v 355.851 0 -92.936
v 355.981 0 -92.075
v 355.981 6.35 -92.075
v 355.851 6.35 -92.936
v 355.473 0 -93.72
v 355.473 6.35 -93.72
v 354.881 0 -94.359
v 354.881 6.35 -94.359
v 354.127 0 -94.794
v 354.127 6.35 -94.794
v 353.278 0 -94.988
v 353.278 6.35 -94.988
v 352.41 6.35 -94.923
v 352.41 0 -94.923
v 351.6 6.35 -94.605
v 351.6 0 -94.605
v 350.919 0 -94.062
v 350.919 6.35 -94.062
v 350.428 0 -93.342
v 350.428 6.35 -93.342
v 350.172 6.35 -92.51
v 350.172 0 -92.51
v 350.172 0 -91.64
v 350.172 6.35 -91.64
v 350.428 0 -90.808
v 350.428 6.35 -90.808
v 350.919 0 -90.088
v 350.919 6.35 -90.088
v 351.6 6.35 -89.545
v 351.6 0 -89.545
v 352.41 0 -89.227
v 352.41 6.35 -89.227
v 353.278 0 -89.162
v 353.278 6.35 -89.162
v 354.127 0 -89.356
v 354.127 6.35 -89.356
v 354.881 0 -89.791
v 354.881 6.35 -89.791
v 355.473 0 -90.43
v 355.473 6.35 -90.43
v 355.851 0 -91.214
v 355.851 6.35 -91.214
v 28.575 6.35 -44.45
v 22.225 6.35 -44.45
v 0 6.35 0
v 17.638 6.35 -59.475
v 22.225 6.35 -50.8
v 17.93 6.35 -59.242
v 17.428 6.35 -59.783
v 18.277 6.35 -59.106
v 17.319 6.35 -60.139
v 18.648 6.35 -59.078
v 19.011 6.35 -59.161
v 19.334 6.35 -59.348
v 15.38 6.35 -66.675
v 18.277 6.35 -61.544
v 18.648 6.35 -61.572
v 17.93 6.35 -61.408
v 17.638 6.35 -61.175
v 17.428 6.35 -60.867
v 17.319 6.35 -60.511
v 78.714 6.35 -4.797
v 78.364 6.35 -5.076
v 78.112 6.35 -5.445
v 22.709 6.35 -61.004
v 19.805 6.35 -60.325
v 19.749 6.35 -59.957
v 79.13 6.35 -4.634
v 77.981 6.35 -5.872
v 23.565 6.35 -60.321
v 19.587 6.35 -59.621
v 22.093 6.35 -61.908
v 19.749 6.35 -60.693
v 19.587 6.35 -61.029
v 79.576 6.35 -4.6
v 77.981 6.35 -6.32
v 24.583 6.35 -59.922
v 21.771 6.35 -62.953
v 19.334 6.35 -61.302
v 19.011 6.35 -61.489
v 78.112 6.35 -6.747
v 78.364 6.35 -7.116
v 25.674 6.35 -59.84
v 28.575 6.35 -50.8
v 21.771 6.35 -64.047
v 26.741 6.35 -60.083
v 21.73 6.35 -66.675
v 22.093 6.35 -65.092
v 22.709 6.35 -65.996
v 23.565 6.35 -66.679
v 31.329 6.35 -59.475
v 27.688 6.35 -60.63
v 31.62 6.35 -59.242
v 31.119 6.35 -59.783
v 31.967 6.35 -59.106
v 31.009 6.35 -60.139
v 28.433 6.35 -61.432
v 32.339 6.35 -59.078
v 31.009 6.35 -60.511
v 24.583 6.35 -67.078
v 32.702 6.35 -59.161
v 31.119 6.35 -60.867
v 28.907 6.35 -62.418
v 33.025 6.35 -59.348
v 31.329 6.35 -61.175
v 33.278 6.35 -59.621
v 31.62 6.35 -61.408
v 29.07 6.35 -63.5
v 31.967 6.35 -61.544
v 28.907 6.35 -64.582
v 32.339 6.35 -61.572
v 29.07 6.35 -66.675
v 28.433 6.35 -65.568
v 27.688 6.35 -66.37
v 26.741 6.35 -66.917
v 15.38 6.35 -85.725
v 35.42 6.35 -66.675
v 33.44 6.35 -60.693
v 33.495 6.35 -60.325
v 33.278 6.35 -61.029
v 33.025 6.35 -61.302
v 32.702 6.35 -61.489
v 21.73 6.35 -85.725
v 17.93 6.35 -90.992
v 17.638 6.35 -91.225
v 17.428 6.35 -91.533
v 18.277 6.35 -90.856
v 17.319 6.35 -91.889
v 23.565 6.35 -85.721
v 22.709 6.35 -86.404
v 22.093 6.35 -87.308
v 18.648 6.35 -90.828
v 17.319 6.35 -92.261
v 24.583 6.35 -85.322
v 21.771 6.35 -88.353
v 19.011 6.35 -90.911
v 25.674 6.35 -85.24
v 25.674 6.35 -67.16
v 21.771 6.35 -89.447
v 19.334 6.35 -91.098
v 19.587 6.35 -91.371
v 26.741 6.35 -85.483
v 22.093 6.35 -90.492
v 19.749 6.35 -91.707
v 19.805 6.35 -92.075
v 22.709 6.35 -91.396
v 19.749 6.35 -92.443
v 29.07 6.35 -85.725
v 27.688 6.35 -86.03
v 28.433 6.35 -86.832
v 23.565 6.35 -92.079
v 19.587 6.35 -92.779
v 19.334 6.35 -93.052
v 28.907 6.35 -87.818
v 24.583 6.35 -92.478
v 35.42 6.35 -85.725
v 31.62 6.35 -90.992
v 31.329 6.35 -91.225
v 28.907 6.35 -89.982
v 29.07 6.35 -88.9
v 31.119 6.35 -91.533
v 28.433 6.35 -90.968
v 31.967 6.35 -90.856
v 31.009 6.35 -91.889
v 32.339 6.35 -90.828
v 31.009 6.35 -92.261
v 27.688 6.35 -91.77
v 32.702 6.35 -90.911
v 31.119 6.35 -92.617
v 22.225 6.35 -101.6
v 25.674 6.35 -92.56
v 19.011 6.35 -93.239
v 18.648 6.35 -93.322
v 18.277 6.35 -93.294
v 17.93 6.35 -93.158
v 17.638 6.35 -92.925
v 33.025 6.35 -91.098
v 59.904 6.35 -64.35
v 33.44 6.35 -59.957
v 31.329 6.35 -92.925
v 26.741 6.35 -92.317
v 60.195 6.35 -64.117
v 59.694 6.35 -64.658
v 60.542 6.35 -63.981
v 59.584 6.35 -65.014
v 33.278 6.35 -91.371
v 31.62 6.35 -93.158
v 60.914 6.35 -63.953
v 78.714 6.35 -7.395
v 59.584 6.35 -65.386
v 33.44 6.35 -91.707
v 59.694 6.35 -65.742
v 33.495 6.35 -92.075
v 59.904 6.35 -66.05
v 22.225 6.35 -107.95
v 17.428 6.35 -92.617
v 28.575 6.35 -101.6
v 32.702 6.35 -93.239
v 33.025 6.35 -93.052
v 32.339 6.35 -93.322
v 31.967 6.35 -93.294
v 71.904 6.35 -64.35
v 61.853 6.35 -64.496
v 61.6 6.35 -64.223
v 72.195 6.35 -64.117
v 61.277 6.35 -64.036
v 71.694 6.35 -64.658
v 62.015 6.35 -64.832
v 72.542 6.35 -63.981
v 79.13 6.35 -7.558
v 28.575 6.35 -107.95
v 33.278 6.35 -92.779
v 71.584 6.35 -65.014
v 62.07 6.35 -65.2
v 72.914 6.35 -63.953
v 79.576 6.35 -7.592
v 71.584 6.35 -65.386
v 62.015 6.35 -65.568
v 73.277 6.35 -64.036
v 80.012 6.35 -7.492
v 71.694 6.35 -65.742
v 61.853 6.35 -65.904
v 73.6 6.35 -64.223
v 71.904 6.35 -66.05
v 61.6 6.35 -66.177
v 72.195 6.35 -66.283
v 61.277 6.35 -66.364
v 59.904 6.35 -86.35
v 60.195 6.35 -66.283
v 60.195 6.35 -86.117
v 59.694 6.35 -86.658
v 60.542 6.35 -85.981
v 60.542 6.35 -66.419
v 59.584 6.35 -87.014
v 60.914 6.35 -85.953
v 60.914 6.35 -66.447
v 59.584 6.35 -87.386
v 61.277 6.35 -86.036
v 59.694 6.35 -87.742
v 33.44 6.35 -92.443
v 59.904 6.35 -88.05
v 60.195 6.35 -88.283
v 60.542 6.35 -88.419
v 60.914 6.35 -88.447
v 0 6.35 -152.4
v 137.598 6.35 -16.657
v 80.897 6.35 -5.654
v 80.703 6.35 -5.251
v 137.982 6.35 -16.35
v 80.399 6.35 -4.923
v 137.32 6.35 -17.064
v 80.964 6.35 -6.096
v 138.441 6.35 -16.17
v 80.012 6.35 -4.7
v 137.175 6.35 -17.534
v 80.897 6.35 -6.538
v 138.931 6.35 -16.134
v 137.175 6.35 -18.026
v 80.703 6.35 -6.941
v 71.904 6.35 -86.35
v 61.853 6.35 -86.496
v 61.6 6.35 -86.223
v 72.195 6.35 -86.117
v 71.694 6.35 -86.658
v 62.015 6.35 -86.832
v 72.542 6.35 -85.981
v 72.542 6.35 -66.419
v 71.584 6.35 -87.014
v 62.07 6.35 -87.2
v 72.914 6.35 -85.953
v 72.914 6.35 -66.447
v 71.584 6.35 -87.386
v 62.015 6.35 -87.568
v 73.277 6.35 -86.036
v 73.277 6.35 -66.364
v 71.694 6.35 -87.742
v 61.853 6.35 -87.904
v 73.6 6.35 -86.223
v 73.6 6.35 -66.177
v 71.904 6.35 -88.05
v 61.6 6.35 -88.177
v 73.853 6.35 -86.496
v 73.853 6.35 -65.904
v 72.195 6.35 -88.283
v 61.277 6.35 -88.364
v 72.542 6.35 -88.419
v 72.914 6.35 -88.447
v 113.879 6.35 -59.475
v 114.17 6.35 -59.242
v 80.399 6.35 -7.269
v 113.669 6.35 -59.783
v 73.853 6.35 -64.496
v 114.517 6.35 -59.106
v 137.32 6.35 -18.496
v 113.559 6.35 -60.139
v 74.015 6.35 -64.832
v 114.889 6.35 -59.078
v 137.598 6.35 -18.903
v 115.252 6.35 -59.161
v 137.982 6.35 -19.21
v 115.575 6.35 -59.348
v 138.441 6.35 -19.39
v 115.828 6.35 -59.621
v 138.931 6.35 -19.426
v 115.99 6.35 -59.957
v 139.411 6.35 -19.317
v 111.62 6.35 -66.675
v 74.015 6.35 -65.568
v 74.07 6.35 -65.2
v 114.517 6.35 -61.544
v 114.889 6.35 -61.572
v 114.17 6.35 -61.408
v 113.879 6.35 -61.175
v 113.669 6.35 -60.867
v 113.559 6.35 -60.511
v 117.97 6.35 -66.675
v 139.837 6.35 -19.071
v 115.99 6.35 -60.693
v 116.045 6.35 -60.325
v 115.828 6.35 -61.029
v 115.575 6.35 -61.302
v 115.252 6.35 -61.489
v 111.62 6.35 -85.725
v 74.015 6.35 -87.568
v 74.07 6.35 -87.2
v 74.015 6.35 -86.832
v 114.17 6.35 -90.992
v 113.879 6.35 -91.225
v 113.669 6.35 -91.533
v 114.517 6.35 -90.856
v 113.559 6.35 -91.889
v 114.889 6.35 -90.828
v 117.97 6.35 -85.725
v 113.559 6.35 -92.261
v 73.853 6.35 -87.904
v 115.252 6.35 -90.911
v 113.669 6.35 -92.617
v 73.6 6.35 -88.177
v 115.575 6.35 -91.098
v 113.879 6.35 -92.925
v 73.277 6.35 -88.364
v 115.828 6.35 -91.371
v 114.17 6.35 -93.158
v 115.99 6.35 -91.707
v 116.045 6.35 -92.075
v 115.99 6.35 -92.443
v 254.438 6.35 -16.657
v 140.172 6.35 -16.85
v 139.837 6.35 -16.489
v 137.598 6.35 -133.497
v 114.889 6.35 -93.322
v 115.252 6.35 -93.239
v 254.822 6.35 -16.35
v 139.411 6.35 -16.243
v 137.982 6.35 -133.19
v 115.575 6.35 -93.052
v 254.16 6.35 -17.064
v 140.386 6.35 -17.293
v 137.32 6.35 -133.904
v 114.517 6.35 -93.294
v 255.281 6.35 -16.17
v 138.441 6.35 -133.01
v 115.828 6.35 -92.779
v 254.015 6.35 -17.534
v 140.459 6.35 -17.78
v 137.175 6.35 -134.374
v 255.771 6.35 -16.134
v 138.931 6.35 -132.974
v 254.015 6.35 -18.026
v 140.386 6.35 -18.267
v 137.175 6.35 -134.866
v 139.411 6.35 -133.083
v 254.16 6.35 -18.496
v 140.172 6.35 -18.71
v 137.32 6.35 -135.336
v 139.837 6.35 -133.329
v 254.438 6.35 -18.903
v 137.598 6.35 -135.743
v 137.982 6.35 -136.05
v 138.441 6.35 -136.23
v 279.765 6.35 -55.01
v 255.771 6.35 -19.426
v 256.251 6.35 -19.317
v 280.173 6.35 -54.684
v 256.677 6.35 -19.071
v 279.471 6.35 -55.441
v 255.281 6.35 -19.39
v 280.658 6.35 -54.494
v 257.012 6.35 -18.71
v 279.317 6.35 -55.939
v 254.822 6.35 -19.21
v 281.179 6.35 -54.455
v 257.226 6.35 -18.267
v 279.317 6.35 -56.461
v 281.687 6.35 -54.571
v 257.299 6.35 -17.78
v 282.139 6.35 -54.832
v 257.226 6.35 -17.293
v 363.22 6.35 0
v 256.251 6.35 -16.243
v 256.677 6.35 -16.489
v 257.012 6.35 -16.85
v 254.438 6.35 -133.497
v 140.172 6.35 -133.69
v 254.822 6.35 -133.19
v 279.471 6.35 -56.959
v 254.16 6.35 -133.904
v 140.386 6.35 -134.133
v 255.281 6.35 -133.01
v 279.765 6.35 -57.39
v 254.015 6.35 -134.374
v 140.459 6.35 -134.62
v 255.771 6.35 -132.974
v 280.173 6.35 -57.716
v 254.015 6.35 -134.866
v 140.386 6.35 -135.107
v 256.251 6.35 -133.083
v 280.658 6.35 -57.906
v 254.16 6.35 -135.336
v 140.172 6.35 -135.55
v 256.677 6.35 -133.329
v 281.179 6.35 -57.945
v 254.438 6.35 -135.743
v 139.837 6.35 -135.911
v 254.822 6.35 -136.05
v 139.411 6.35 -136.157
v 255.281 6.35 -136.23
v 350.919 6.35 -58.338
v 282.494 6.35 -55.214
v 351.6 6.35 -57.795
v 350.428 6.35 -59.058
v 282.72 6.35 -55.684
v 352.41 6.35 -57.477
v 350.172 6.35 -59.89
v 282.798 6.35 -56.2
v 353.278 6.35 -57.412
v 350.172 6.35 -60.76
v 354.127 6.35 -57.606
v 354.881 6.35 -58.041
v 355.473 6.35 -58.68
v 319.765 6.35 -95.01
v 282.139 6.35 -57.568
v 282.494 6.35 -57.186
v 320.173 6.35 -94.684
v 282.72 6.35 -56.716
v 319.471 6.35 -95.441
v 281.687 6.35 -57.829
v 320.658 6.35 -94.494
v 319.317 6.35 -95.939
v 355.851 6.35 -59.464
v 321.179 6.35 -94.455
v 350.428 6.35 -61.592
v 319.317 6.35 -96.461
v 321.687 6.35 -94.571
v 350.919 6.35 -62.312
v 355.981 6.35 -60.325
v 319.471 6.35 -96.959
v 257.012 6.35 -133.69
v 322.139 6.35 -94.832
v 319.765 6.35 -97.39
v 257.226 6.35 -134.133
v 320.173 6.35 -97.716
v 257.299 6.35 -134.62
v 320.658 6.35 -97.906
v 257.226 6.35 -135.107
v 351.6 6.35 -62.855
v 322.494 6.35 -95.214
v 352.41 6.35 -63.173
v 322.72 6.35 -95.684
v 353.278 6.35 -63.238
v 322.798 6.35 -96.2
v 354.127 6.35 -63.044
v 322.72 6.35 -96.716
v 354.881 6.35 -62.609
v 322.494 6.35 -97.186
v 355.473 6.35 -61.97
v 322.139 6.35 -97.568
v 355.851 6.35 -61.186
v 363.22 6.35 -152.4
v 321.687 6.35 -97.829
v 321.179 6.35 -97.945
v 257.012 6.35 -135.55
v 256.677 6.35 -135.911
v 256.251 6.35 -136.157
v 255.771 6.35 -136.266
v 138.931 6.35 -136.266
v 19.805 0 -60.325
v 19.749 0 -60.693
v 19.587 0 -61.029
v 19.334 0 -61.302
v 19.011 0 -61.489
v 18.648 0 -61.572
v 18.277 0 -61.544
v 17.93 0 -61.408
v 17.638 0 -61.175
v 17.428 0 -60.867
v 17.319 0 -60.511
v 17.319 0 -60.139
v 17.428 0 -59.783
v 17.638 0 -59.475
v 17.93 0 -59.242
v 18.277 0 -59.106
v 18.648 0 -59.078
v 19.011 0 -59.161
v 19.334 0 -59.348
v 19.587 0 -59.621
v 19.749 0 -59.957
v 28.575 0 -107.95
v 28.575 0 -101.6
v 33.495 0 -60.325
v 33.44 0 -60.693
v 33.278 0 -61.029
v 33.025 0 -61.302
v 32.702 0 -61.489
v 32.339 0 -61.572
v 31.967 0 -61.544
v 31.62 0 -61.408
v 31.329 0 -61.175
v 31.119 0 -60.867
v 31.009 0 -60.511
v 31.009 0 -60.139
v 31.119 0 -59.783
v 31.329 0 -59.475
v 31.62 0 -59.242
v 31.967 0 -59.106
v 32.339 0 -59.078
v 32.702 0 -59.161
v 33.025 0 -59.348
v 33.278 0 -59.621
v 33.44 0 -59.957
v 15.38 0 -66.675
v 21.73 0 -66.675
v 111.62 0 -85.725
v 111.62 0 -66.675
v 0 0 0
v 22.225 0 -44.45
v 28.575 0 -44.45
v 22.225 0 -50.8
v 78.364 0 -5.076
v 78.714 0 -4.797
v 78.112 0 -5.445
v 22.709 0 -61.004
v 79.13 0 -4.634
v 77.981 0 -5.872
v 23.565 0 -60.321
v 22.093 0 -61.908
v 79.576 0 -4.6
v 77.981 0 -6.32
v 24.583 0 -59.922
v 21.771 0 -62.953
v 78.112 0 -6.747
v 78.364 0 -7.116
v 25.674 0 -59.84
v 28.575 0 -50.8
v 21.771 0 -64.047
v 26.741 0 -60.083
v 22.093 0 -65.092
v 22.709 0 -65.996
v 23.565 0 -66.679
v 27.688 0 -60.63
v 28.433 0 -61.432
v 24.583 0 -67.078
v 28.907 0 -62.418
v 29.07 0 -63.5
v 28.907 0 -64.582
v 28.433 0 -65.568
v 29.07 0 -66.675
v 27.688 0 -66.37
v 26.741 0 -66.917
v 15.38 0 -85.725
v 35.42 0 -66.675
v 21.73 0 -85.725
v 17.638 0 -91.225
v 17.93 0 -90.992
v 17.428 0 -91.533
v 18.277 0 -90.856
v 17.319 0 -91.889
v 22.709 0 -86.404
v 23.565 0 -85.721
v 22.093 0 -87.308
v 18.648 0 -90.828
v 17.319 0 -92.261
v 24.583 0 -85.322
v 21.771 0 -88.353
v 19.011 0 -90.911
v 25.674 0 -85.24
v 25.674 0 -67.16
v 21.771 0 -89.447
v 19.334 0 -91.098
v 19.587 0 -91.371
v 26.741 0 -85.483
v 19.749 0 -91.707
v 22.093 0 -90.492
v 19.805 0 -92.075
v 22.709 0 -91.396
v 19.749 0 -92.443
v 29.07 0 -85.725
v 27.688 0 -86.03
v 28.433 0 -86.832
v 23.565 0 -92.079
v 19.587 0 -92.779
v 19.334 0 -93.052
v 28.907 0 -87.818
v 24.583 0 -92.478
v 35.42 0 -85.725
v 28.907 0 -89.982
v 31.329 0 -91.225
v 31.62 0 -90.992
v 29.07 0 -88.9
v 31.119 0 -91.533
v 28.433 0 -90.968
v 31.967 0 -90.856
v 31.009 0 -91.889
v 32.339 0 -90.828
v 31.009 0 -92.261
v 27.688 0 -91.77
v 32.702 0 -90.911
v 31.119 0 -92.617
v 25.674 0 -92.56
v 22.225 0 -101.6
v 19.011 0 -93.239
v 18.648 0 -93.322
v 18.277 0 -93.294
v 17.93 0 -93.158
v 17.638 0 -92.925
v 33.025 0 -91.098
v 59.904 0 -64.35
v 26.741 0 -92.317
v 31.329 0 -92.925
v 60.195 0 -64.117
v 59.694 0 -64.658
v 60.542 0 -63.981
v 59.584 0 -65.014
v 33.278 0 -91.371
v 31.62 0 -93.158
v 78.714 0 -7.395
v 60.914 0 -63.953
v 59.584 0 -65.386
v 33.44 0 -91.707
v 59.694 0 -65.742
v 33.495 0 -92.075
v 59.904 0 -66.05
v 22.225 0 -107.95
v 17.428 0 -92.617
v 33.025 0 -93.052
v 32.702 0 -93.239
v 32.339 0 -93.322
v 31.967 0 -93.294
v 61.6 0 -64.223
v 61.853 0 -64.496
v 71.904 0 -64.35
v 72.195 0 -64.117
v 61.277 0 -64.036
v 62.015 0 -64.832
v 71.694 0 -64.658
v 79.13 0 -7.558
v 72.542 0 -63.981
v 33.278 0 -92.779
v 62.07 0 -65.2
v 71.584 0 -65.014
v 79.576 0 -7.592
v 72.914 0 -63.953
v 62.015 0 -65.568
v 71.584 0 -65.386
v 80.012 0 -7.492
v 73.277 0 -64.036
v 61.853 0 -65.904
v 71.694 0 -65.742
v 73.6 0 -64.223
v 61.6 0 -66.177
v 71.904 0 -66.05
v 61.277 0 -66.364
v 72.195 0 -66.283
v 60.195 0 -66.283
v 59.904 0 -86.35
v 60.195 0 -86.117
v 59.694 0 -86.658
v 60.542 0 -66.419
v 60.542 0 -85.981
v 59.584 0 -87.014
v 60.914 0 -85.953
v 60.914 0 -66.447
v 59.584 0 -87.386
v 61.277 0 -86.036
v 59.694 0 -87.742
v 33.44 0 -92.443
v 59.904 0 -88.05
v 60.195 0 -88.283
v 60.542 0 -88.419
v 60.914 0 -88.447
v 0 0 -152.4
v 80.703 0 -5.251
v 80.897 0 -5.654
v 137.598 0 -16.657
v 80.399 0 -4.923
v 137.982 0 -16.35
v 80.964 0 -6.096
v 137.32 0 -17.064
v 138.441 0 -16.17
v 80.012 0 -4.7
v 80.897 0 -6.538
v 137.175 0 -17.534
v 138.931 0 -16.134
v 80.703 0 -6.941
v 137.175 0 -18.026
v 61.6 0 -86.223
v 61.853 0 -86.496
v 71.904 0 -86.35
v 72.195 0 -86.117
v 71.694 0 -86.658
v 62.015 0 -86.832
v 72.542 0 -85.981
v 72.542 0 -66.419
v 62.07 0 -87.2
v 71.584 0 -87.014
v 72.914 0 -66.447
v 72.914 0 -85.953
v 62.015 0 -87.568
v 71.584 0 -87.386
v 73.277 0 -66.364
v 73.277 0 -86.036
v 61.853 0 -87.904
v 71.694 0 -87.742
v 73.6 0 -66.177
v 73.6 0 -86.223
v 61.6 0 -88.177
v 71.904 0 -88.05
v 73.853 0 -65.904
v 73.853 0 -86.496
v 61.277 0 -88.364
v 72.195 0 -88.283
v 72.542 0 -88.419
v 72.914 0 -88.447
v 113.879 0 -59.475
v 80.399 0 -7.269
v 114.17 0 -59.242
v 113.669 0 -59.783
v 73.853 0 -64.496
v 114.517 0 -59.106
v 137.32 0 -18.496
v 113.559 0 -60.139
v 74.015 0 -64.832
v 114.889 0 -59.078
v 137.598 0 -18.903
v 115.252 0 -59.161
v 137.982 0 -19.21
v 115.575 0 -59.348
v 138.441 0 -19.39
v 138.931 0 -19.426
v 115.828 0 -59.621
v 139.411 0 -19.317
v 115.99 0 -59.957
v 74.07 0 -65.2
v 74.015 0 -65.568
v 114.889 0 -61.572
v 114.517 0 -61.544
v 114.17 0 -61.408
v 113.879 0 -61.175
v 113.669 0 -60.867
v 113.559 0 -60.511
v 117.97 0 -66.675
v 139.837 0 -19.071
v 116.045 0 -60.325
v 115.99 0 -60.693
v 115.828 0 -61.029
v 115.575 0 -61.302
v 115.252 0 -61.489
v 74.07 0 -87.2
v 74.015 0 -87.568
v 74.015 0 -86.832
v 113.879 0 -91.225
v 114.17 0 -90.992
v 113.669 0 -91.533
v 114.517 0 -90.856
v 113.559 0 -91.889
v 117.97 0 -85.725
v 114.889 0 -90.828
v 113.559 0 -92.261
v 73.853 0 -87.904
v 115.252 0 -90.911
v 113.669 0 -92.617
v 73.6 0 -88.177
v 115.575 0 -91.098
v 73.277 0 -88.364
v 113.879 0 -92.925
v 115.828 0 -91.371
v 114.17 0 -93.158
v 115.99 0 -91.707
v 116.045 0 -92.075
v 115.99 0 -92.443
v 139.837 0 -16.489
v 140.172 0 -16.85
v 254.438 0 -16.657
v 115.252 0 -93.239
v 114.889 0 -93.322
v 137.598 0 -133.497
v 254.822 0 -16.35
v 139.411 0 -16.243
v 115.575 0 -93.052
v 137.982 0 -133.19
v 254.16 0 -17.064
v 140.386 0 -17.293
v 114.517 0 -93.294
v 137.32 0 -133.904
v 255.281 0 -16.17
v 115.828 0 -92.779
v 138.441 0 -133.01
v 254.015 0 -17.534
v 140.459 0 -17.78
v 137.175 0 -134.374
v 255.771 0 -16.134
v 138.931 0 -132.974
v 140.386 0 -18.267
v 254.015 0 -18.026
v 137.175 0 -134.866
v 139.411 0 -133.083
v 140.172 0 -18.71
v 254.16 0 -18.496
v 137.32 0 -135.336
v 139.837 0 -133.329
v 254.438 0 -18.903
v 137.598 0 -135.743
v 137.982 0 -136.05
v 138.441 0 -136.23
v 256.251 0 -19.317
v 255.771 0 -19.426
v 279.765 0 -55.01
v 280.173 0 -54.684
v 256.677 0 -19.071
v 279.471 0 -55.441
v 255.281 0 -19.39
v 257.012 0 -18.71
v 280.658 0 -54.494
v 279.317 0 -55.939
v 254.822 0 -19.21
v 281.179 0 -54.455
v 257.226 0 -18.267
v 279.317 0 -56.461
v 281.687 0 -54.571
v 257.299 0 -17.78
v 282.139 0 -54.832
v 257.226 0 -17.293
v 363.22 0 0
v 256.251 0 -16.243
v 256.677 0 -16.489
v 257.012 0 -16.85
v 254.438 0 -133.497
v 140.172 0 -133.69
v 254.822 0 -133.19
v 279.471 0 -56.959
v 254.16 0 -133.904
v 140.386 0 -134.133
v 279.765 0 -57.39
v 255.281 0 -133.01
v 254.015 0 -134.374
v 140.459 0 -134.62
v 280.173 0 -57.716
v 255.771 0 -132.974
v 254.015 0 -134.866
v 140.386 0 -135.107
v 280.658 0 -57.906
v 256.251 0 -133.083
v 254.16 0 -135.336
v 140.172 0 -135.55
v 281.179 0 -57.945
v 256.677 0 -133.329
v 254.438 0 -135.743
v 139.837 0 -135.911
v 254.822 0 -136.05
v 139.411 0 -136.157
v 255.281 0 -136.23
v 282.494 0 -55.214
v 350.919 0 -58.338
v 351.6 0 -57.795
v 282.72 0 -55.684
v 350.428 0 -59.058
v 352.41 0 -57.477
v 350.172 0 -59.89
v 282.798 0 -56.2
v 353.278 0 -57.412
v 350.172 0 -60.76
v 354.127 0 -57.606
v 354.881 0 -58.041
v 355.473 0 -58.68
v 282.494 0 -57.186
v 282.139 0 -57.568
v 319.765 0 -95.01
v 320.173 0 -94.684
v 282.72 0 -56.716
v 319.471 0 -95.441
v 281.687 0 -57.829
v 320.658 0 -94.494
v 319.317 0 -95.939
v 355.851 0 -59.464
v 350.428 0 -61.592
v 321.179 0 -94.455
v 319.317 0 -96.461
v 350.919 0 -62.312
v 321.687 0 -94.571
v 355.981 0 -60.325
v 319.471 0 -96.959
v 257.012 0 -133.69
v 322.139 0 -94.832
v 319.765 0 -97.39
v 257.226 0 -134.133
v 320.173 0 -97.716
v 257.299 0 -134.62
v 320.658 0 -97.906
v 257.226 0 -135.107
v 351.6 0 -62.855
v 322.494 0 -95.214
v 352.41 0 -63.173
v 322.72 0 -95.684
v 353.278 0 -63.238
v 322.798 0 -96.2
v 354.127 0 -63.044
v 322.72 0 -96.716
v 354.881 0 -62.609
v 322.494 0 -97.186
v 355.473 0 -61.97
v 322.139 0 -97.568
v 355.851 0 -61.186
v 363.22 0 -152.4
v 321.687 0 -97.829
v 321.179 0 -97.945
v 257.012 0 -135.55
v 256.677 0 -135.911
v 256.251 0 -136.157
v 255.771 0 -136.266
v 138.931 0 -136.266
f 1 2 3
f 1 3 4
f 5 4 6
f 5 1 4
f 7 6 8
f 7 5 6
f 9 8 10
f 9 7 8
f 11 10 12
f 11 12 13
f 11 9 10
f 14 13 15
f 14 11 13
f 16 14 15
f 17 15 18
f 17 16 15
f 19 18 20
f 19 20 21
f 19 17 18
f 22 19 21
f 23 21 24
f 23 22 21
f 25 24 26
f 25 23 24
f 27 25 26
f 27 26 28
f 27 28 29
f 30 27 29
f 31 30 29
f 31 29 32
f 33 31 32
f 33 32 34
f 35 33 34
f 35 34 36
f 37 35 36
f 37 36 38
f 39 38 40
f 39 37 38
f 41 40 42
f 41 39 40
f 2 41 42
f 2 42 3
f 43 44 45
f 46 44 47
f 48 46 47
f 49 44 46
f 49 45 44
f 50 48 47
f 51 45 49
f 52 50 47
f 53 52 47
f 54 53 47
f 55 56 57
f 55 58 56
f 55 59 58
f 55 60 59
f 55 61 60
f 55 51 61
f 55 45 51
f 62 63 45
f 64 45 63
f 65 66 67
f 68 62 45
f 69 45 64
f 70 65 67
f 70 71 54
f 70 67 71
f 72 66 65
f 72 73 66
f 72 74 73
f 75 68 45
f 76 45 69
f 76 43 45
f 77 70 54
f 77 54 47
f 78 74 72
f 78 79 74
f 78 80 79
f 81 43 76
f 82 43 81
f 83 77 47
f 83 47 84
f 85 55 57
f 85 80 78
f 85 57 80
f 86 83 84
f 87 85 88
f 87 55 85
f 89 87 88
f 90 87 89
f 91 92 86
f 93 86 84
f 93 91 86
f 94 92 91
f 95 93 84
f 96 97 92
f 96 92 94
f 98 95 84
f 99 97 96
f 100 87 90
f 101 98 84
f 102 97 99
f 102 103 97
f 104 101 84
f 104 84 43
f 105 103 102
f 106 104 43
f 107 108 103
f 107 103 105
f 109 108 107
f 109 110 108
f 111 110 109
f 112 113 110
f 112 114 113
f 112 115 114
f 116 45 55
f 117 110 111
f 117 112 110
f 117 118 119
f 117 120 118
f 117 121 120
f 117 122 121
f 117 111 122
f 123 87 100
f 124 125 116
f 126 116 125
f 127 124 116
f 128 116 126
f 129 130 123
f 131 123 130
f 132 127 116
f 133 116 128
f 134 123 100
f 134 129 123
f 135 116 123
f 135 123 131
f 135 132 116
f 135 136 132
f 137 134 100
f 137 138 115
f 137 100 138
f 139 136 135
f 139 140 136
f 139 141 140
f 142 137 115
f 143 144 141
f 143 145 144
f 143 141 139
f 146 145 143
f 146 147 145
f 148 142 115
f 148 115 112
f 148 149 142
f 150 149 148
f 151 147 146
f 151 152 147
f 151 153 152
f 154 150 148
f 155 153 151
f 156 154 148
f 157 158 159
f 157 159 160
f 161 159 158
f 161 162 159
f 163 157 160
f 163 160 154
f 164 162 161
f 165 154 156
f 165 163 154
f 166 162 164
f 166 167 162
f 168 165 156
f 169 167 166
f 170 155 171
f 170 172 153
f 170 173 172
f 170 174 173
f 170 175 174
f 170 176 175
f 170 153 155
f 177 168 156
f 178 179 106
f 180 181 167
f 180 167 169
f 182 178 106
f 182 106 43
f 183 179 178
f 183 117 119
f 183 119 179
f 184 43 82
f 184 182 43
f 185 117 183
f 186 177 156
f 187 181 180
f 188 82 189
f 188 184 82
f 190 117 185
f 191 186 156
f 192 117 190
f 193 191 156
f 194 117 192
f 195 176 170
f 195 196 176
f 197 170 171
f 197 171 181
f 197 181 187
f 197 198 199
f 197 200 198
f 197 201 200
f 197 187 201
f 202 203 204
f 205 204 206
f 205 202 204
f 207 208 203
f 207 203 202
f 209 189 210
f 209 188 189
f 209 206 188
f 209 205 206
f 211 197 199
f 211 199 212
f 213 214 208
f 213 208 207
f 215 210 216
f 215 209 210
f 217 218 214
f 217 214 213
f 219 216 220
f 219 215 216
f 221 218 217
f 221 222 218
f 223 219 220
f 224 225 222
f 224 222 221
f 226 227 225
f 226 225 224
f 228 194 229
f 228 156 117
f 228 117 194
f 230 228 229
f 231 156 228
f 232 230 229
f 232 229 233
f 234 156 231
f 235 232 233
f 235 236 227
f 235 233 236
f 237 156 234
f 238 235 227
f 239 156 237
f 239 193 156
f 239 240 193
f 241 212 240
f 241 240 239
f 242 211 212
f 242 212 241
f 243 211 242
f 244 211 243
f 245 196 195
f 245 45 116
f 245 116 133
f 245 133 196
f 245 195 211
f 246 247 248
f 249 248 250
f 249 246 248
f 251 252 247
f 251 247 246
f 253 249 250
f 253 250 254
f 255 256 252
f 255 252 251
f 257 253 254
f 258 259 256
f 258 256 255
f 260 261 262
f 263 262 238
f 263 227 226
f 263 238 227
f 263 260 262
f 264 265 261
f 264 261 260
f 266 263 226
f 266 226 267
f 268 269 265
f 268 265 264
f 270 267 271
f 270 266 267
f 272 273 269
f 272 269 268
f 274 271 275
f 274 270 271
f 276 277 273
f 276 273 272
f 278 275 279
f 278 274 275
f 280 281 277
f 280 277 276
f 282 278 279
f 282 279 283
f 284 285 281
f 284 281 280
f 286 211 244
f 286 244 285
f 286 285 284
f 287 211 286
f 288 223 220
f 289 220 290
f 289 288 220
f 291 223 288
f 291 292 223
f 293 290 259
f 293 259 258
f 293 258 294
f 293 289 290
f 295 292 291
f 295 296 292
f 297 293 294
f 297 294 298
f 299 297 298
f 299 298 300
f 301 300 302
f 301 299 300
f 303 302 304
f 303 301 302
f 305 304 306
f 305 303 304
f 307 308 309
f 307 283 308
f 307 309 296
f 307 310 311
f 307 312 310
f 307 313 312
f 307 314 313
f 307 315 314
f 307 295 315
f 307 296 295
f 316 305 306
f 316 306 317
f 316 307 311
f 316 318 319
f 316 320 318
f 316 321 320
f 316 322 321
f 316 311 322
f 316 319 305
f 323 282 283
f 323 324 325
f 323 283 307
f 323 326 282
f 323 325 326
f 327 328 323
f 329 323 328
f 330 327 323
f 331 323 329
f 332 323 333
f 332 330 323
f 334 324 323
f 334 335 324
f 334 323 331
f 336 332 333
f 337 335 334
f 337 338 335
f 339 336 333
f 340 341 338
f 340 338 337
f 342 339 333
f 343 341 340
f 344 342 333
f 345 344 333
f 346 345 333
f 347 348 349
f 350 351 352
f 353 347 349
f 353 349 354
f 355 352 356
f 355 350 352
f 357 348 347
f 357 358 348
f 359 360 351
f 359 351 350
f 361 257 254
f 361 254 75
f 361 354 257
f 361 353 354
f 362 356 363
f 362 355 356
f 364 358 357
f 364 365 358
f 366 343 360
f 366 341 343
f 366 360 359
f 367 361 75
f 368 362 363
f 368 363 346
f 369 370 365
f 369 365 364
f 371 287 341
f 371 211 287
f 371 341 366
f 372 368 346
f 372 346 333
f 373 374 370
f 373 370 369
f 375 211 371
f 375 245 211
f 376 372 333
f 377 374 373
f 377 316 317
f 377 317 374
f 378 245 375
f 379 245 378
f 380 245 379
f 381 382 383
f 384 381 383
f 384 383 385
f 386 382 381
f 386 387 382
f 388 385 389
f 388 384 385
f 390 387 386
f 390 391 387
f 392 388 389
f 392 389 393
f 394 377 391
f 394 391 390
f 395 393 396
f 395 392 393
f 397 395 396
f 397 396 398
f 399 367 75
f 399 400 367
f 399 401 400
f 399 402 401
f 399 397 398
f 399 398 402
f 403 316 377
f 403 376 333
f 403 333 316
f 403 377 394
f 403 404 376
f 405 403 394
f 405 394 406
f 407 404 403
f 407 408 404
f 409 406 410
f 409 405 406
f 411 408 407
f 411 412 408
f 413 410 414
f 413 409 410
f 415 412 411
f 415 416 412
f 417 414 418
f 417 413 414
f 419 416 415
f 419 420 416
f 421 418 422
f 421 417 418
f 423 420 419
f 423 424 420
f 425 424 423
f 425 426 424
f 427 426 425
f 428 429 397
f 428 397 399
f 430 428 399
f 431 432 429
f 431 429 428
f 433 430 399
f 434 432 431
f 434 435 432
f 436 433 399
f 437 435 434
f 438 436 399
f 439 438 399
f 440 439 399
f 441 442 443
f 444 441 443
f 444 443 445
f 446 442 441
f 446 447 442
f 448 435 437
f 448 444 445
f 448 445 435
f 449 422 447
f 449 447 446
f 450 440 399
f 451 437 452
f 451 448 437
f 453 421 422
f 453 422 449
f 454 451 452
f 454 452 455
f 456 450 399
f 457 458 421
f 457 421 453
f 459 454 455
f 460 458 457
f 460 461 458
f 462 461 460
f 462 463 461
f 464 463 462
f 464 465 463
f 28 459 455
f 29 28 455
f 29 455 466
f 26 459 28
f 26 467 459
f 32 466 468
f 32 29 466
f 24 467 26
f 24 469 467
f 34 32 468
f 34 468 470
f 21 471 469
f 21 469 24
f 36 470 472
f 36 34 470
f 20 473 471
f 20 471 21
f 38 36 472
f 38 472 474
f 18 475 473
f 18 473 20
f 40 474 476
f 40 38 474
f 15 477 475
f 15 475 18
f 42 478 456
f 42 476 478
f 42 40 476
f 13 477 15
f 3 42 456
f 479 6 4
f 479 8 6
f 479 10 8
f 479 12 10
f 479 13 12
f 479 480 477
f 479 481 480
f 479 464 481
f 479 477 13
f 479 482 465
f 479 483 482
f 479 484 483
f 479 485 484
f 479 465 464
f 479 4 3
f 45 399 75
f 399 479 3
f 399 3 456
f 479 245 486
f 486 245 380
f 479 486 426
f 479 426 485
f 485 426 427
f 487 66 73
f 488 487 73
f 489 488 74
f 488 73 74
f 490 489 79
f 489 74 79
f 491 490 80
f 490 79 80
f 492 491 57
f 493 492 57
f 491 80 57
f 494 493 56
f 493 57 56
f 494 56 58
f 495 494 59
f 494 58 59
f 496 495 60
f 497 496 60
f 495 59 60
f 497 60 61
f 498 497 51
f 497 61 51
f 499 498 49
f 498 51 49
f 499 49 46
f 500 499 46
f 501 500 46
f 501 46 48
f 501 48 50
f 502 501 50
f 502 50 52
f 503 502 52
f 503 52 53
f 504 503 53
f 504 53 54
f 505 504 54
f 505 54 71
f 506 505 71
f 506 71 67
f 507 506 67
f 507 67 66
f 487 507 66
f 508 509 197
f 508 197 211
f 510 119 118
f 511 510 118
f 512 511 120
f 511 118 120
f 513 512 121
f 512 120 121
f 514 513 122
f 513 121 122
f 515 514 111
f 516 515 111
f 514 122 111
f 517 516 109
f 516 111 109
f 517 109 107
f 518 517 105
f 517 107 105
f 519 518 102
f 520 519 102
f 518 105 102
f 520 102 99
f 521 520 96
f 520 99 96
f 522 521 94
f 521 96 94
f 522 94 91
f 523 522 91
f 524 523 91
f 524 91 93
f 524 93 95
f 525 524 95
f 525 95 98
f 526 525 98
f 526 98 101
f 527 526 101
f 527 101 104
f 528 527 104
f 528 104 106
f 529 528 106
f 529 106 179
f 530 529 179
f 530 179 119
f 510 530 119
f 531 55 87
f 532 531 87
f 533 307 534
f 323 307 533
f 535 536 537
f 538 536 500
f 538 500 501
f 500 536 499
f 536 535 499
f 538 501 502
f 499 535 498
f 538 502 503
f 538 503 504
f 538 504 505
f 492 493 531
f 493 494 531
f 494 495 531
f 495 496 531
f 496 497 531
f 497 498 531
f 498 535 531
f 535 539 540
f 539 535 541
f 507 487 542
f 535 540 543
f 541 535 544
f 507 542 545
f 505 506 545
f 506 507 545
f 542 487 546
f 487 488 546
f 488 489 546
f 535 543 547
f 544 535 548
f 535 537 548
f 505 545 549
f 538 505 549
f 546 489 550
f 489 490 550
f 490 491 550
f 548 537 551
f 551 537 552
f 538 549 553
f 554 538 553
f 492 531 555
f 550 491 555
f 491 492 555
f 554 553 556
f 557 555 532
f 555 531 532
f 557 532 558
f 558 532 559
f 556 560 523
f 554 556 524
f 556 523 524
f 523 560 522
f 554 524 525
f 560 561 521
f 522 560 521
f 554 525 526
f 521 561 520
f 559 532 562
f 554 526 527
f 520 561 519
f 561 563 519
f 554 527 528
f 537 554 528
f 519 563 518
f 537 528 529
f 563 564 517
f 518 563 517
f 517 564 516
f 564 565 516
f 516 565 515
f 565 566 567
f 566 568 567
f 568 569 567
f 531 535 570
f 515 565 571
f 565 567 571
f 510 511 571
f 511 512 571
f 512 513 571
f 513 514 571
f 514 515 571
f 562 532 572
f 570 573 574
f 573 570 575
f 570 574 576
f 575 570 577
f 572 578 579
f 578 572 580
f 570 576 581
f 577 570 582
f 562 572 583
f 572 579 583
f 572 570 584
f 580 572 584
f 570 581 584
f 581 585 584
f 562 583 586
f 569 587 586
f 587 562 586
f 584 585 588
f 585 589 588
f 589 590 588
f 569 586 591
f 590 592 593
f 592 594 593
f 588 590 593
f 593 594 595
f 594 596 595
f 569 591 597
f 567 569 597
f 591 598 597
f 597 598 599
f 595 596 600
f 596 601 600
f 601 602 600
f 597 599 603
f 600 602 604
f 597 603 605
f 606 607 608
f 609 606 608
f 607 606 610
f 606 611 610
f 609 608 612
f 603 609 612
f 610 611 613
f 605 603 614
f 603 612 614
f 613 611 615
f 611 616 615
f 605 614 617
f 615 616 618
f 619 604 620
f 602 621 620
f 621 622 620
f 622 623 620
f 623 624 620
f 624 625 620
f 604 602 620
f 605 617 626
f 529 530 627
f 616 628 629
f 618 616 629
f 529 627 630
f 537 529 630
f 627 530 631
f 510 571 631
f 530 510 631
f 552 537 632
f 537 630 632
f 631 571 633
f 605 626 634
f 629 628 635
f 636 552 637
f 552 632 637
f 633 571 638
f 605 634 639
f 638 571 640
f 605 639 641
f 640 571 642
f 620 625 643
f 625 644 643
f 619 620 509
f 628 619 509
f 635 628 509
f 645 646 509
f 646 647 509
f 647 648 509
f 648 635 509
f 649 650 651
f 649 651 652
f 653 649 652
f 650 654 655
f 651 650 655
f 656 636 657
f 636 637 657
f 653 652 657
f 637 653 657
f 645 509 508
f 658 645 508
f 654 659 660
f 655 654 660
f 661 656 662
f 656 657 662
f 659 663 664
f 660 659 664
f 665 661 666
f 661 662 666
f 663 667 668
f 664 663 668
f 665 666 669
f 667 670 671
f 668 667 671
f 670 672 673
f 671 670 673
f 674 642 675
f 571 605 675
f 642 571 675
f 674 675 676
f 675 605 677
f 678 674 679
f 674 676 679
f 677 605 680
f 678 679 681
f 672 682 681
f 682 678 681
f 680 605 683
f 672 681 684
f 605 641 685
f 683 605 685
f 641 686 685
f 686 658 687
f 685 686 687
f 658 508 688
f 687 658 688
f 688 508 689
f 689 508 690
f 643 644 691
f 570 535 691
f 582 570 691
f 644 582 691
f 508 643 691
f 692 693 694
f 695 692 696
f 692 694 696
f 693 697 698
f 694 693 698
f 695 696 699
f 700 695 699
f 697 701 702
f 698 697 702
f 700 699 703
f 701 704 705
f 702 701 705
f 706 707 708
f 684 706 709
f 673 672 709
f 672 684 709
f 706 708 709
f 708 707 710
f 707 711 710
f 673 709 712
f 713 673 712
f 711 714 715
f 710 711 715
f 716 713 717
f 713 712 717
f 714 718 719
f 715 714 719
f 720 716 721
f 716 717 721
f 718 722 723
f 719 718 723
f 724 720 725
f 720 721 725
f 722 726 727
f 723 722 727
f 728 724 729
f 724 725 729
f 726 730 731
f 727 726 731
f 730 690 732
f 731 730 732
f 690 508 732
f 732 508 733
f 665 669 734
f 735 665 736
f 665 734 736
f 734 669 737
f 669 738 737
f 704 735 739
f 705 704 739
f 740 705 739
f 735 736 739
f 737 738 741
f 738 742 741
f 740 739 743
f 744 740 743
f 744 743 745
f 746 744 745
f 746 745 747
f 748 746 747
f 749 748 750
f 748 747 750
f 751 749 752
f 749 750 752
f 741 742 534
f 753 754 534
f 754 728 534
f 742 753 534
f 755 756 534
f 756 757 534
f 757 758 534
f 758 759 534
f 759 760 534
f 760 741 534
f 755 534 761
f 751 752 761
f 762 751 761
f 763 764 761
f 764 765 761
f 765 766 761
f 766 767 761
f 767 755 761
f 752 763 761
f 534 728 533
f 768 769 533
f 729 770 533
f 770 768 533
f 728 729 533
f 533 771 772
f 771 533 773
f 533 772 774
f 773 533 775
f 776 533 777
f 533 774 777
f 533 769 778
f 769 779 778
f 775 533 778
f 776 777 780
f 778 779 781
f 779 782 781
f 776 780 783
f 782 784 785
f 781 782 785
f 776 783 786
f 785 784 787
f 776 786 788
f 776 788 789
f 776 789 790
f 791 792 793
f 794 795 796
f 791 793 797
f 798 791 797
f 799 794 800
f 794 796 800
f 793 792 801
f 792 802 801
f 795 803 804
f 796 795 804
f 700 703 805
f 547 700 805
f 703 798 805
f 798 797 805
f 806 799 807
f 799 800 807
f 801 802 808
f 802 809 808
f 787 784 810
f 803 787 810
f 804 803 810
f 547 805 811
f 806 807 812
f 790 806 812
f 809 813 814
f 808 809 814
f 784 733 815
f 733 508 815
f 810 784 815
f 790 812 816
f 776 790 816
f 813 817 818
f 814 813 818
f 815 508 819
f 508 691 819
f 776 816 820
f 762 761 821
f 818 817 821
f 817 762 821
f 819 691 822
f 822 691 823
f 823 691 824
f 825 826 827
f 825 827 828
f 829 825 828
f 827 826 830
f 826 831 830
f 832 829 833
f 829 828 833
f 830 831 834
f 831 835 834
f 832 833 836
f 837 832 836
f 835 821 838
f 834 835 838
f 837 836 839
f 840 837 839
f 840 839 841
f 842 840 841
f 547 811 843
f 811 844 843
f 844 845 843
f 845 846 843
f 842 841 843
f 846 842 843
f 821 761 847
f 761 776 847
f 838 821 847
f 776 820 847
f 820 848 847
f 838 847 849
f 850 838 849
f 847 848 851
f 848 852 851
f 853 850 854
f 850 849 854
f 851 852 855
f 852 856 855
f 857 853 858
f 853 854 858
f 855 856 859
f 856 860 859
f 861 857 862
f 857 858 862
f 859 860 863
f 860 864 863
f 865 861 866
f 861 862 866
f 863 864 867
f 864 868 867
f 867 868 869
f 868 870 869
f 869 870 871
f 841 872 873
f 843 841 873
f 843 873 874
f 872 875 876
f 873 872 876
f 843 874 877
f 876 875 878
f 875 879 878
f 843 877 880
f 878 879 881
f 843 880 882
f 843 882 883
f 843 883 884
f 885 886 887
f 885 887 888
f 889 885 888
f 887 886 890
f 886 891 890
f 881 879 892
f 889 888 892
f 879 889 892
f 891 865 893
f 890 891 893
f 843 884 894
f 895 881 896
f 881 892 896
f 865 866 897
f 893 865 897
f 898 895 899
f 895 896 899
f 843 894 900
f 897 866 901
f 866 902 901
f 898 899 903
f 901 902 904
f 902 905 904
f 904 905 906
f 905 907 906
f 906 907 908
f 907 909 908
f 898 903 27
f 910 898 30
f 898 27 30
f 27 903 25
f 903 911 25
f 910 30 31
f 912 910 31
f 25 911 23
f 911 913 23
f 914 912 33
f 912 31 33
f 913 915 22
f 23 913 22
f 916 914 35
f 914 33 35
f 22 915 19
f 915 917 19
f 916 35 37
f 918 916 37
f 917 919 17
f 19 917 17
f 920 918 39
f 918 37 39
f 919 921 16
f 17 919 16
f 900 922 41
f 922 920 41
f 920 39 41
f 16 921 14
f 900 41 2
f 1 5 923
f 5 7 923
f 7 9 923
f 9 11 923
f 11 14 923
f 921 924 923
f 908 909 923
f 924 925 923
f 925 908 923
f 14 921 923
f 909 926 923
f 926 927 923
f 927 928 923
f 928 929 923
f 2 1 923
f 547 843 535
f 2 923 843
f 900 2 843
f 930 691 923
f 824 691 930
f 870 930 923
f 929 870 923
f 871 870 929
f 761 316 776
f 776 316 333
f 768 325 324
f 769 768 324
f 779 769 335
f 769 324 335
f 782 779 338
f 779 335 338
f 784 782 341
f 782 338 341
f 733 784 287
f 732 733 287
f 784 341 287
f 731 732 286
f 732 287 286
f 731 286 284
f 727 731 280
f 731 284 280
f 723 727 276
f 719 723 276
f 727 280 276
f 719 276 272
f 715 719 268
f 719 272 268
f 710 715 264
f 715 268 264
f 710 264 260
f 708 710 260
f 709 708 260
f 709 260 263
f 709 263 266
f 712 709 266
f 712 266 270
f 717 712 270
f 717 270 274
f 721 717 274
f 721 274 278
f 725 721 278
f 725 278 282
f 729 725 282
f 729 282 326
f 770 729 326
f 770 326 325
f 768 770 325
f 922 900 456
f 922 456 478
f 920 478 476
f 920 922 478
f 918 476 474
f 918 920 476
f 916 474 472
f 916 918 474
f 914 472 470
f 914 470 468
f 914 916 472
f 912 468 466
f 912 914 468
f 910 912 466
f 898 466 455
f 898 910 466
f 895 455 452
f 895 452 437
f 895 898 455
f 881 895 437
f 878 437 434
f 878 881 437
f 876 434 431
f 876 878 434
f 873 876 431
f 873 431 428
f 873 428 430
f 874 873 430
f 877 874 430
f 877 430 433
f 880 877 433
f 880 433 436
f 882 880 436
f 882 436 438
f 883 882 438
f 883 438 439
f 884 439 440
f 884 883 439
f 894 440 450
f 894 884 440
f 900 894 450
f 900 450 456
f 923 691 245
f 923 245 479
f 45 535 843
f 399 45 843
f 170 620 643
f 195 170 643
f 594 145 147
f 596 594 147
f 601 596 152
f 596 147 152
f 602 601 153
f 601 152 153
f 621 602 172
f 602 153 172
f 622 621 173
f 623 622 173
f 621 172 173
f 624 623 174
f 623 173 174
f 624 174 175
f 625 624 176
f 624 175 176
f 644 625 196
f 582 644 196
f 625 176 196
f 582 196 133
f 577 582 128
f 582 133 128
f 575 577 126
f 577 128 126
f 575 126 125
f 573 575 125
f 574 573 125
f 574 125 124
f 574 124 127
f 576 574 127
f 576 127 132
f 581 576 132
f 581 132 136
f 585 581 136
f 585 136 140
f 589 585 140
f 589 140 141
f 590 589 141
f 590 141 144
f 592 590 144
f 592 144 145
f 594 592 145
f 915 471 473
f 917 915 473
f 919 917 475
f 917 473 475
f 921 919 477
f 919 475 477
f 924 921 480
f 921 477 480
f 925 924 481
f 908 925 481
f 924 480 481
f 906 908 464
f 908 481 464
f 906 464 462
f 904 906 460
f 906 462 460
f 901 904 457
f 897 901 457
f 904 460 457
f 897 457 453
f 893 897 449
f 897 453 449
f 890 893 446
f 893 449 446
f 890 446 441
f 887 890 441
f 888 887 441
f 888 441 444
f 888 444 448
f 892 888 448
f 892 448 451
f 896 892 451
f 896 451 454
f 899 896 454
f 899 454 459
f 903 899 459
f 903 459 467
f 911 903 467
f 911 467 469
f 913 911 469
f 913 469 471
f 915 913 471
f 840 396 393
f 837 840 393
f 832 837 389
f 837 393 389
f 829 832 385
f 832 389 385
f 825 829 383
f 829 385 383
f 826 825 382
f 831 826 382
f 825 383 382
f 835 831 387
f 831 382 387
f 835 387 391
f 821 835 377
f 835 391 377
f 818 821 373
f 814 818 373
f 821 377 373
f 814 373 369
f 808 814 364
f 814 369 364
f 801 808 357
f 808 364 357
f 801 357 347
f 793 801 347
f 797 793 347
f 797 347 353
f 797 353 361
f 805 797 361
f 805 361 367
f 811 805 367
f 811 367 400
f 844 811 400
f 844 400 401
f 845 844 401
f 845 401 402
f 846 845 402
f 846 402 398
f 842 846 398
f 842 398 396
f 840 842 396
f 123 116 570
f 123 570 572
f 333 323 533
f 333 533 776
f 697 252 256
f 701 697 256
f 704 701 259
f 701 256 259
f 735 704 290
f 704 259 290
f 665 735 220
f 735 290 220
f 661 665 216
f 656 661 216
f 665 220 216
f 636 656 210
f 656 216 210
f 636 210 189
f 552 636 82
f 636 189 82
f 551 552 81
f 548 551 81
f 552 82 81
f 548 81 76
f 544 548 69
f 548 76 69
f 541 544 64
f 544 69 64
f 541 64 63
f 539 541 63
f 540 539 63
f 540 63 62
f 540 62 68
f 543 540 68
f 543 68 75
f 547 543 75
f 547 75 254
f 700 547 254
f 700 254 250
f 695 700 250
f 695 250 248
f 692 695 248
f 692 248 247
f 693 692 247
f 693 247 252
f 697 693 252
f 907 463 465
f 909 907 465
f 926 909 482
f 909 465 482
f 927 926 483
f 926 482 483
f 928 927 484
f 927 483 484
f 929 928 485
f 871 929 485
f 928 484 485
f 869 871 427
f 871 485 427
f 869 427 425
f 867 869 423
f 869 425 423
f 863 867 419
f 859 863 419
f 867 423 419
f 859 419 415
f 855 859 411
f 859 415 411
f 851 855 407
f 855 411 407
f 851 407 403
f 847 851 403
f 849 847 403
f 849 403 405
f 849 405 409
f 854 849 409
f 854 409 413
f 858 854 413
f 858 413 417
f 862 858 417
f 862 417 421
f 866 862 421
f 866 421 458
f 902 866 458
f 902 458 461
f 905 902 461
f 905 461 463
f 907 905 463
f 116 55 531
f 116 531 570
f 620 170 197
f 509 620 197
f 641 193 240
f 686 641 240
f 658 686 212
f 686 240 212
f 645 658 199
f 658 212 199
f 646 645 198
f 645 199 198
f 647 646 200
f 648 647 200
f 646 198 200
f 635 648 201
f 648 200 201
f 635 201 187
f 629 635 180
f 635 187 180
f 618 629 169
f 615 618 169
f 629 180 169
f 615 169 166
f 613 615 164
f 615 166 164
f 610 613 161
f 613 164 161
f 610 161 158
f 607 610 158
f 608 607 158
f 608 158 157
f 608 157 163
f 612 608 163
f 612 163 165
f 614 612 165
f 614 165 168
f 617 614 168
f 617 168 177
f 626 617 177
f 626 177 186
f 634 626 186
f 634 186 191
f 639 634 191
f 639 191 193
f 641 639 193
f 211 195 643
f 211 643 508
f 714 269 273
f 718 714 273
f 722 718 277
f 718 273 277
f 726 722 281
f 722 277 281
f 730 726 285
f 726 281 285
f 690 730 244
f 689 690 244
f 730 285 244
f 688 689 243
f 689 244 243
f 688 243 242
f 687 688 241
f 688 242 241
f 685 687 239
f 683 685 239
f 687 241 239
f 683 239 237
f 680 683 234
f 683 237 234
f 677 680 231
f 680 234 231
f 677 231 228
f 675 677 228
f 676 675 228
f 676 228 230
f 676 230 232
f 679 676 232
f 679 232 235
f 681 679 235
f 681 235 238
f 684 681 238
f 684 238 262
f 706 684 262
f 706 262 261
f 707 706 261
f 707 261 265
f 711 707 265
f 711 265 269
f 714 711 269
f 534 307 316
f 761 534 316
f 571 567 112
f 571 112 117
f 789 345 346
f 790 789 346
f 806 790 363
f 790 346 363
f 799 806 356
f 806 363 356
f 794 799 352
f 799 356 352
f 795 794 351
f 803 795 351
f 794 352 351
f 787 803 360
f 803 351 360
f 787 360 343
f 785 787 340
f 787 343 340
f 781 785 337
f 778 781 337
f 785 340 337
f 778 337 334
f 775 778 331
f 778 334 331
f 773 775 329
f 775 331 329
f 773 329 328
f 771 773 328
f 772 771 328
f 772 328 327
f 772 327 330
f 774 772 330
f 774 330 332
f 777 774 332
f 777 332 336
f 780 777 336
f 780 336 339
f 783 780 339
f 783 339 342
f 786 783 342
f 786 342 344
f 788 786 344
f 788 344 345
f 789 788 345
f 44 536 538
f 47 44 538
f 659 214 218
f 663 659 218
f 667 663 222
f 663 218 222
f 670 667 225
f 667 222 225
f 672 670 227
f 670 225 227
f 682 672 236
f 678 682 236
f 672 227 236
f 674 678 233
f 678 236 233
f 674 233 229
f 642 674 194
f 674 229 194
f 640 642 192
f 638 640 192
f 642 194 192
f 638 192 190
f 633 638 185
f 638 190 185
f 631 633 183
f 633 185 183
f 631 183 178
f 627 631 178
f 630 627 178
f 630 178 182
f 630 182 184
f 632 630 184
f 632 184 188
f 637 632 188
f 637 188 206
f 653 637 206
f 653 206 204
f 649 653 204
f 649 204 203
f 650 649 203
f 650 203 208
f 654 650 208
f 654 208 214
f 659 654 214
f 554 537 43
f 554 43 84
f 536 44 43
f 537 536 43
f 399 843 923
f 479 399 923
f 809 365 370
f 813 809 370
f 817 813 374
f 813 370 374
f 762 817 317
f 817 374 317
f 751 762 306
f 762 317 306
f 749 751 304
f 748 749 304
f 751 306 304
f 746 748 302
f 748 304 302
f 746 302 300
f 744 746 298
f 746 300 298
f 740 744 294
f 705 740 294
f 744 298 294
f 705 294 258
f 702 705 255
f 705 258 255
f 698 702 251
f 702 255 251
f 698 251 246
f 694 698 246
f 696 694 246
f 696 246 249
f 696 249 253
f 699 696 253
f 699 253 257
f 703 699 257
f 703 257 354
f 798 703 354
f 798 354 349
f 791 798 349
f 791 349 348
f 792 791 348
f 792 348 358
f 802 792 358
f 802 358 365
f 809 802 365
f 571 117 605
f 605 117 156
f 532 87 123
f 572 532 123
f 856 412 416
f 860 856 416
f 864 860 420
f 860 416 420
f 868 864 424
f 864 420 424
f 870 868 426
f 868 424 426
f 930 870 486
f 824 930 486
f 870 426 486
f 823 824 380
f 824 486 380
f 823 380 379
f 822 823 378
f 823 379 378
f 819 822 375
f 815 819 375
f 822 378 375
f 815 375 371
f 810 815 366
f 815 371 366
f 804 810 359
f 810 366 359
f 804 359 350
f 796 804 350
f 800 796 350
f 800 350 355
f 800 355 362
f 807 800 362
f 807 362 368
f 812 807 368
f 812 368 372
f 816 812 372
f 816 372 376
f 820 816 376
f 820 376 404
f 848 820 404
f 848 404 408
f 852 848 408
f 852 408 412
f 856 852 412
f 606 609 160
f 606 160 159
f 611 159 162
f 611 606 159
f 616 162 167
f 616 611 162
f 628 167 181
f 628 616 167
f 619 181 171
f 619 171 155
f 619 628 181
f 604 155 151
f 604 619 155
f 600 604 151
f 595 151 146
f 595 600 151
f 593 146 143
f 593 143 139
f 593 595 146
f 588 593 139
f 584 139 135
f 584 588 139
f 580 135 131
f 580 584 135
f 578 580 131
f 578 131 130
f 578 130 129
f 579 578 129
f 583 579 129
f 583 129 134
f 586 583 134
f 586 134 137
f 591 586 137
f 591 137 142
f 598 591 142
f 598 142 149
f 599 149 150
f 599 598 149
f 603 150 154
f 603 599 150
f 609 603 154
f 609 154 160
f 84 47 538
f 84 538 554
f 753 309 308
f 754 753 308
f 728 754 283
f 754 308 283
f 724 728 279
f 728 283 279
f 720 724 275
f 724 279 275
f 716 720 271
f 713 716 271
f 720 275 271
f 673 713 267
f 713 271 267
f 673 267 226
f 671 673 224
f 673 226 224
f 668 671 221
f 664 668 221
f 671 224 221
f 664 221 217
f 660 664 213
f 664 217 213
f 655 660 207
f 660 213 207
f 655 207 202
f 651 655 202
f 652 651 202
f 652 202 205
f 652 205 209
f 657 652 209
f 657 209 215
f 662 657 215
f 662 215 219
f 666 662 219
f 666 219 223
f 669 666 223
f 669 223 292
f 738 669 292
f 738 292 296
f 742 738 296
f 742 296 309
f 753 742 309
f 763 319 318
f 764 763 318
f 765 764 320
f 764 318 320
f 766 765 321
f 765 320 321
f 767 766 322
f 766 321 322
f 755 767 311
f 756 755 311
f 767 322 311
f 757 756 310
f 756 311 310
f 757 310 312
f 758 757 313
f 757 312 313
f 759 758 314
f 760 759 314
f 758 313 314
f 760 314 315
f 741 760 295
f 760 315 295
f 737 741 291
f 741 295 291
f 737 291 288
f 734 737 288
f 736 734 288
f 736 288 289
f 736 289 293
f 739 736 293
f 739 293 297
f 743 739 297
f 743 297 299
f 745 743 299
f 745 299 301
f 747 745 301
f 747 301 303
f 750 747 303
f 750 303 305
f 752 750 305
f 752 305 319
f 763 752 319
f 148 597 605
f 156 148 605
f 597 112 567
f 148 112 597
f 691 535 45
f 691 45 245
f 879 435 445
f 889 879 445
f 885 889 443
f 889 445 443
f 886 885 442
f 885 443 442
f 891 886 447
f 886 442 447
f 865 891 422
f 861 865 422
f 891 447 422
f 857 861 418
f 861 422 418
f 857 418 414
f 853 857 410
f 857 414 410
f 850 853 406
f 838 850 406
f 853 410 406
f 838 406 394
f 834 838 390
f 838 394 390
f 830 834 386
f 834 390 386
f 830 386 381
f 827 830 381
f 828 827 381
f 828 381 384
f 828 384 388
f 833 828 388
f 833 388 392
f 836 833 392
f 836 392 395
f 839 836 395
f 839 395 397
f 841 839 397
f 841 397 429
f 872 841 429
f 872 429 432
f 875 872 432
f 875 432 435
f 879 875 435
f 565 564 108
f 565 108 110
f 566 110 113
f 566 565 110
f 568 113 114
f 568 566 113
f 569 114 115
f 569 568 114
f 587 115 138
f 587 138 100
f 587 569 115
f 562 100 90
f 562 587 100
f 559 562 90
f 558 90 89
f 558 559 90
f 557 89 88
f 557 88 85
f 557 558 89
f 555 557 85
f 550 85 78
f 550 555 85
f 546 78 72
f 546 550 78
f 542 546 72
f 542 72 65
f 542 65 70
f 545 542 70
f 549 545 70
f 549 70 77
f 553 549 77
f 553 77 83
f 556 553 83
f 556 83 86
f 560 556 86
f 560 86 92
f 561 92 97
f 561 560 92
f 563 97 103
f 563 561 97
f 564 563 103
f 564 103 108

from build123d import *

# Parameters (mm, degrees)
SKETCH1_W           = 363.22
SKETCH1_H           = 152.4
SKETCH1_R           = 3.6703
SKETCH1_R_2         = 2.921
BOSS_EXTRUDE1_DEPTH = 6.35
SKETCH2_W           = 6.35
SKETCH2_H           = 6.35
SKETCH2_H_2         = 19.05000003
SKETCH2_H_3         = 19.05
CUT_EXTRUDE1_DEPTH  = 7.35
SKETCH5_R           = 1.5
CUT_EXTRUDE2_DEPTH  = 7.35
SKETCH7_R           = 1.651
CUT_EXTRUDE3_DEPTH  = 7.35
SKETCH8_R           = 1.75
CUT_EXTRUDE4_DEPTH  = 7.35
SKETCH9_R           = 1.25
CUT_EXTRUDE5_DEPTH  = 7.35
SKETCH10_R          = 1.25
CUT_EXTRUDE6_DEPTH  = 7.35


with BuildPart() as part:
    # Sketch1 → Boss-Extrude1 (new body)
    with BuildSketch(Plane(origin=(0, 0, 0), x_dir=(1, 0, 0), z_dir=(0, 1, 0))):
        with Locations((181.61, 76.2)):
            Rectangle(SKETCH1_W, SKETCH1_H)
        with Locations((25.4, 63.5)):
            Circle(SKETCH1_R, mode=Mode.SUBTRACT)
        with Locations((25.4, 88.9)):
            Circle(SKETCH1_R, mode=Mode.SUBTRACT)
        with Locations((353.06, 60.325)):
            Circle(SKETCH1_R_2, mode=Mode.SUBTRACT)
        with Locations((353.06, 92.075)):
            Circle(SKETCH1_R_2, mode=Mode.SUBTRACT)
    extrude(amount=BOSS_EXTRUDE1_DEPTH)

    # Sketch2 → Cut-Extrude1 (cut, through all)
    with BuildSketch(Plane(origin=(0, 6.35, 0), x_dir=(1, 0, 0), z_dir=(0, 1, 0))):
        with Locations((25.4, 104.775)):
            Rectangle(SKETCH2_W, SKETCH2_H)
        with Locations((25.4, 47.625)):
            Rectangle(SKETCH2_W, SKETCH2_H)
        with Locations((32.2453, 76.2)):
            Rectangle(SKETCH2_W, SKETCH2_H_2)
        with Locations((18.5547, 76.199999985)):
            Rectangle(SKETCH2_W, SKETCH2_H_3)
        with Locations((114.7953, 76.2)):
            Rectangle(SKETCH2_W, SKETCH2_H_2)
    extrude(amount=-CUT_EXTRUDE1_DEPTH, mode=Mode.SUBTRACT)

    # Sketch5 → Cut-Extrude2 (cut, through all)
    with BuildSketch(Plane(origin=(0, 6.35, 0), x_dir=(1, 0, 0), z_dir=(0, 1, 0))):
        with Locations((79.4639, 6.096)):
            Circle(SKETCH5_R)
    extrude(amount=-CUT_EXTRUDE2_DEPTH, mode=Mode.SUBTRACT)

    # Sketch7 → Cut-Extrude3 (cut, through all)
    with BuildSketch(Plane(origin=(0, 6.35, 0), x_dir=(1, 0, 0), z_dir=(0, 1, 0))):
        with Locations((138.807883042, 134.62)):
            Circle(SKETCH7_R)
        with Locations((255.647883042, 134.62)):
            Circle(SKETCH7_R)
        with Locations((255.647883042, 17.78)):
            Circle(SKETCH7_R)
        with Locations((138.807883042, 17.78)):
            Circle(SKETCH7_R)
    extrude(amount=-CUT_EXTRUDE3_DEPTH, mode=Mode.SUBTRACT)

    # Sketch8 → Cut-Extrude4 (cut, through all)
    with BuildSketch(Plane(origin=(0, 6.35, 0), x_dir=(1, 0, 0), z_dir=(0, 1, 0))):
        with Locations((321.047883042, 96.2)):
            Circle(SKETCH8_R)
        with Locations((281.047883042, 56.2)):
            Circle(SKETCH8_R)
    extrude(amount=-CUT_EXTRUDE4_DEPTH, mode=Mode.SUBTRACT)

    # Sketch9 → Cut-Extrude5 (cut, through all)
    with BuildSketch(Plane(origin=(0, 6.35, 0), x_dir=(1, 0, 0), z_dir=(0, 1, 0))):
        with Locations((18.5547, 92.074999985)):
            Circle(SKETCH9_R)
        with Locations((32.2453, 92.075000015)):
            Circle(SKETCH9_R)
        with Locations((32.2453, 60.324999985)):
            Circle(SKETCH9_R)
        with Locations((18.5547, 60.324999985)):
            Circle(SKETCH9_R)
        with Locations((114.7953, 92.075000015)):
            Circle(SKETCH9_R)
        with Locations((114.7953, 60.324999985)):
            Circle(SKETCH9_R)
    extrude(amount=-CUT_EXTRUDE5_DEPTH, mode=Mode.SUBTRACT)

    # Sketch10 → Cut-Extrude6 (cut, through all)
    with BuildSketch(Plane(origin=(0, 6.35, 0), x_dir=(1, 0, 0), z_dir=(0, 1, 0))):
        with Locations((60.8203, 87.2)):
            Circle(SKETCH10_R)
        with Locations((72.8203, 87.2)):
            Circle(SKETCH10_R)
        with Locations((72.8203, 65.2)):
            Circle(SKETCH10_R)
        with Locations((60.8203, 65.2)):
            Circle(SKETCH10_R)
    extrude(amount=-CUT_EXTRUDE6_DEPTH, mode=Mode.SUBTRACT)


solid = part.part
